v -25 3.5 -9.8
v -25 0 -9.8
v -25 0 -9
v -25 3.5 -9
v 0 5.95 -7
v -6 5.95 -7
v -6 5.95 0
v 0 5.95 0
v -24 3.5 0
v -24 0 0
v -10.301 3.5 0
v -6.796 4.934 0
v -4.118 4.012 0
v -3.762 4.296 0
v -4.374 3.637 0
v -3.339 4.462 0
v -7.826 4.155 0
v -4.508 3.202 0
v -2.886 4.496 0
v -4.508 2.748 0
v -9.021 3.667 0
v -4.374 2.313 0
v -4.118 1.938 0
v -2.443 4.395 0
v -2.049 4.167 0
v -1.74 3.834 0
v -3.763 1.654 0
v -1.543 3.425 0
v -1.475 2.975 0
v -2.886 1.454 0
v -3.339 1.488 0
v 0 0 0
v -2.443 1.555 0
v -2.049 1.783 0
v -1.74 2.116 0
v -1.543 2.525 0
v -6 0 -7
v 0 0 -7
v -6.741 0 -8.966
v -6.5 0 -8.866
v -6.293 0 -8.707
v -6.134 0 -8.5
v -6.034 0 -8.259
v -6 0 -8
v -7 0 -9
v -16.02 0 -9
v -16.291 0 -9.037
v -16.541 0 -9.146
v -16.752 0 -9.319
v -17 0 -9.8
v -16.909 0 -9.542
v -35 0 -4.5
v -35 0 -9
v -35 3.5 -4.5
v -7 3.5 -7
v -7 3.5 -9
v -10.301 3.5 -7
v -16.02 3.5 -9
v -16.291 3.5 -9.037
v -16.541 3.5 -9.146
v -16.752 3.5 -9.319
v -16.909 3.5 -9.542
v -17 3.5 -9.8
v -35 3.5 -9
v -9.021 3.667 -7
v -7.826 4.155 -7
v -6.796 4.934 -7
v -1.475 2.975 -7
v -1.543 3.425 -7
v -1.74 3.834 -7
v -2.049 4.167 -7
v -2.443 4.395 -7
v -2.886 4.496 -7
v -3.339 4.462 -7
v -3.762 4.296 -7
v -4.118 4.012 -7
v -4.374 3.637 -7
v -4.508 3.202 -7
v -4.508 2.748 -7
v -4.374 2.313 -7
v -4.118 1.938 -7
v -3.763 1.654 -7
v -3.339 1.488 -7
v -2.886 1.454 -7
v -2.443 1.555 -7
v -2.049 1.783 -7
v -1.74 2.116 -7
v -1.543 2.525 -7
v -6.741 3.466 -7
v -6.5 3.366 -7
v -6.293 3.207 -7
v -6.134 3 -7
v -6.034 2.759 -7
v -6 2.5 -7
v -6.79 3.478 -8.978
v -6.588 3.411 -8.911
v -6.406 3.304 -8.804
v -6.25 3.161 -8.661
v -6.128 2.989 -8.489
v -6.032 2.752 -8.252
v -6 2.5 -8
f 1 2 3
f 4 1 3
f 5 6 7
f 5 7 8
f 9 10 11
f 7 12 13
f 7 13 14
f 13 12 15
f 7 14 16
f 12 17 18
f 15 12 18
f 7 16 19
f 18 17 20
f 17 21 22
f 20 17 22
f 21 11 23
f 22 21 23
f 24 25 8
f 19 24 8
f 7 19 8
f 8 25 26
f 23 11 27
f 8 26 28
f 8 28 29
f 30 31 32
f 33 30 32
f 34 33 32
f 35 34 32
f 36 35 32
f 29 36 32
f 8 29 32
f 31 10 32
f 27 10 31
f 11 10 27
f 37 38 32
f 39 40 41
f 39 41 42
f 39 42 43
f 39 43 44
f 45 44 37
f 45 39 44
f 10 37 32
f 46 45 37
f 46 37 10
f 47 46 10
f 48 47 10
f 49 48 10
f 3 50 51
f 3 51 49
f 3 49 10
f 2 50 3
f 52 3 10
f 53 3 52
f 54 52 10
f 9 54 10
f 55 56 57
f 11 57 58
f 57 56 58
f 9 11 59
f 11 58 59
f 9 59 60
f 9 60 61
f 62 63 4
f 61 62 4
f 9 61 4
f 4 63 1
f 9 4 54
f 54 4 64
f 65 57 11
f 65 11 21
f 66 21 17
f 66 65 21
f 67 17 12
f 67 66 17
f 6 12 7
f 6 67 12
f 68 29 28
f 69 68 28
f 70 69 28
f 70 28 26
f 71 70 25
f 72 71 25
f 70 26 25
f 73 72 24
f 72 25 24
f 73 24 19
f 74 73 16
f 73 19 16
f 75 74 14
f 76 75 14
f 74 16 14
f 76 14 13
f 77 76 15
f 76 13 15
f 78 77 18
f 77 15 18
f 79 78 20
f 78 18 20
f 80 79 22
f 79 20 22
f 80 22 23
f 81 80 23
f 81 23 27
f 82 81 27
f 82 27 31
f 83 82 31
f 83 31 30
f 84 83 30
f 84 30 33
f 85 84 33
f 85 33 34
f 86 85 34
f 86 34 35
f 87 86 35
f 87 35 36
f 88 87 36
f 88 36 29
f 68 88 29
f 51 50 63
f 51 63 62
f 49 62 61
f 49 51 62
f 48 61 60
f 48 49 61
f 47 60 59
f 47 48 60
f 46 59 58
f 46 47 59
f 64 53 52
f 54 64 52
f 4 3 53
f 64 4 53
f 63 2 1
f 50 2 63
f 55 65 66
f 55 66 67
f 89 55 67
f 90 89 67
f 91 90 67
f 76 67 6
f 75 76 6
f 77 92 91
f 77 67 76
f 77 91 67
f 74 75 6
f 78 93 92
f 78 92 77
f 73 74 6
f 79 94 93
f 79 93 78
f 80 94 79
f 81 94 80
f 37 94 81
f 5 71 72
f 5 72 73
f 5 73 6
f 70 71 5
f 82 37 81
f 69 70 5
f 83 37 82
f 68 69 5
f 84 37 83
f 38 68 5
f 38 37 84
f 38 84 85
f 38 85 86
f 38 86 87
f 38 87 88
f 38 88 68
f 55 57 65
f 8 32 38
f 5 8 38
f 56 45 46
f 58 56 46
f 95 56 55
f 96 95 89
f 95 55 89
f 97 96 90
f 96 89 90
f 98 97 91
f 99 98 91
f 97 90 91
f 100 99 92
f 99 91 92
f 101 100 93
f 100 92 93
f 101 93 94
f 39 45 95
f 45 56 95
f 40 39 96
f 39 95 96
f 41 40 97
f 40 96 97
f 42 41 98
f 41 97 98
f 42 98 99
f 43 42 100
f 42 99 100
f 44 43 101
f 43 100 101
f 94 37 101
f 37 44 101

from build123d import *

# Parameters (mm, degrees)
EXTRUDE_1_DEPTH     = 3.5
SKETCH_2_W          = 6
SKETCH_2_H          = 9
EXTRUDE_2_DEPTH     = 5.95
SKETCH_3_R          = 1.525
CUT_EXTRUDE_1_DEPTH = 38.475358571
SKETCH_4_W          = 8
SKETCH_4_H          = 2.2
CUT_EXTRUDE_2_DEPTH = 10
CUT_EXTRUDE_START   = -9
SKETCH_5_W          = 6
SKETCH_5_H          = 5.95
CUT_EXTRUDE_4_DEPTH = 2
FILLET_1_R          = 5
FILLET_2_R          = 1
FILLET_3_R          = 1


with BuildPart() as part:
    # 草图1 → 凸台-拉伸1 (new body)
    with BuildSketch(Plane(origin=(0, 0, 0), x_dir=(1, 0, 0), z_dir=(0, 1, 0))):
        Polygon((0, 0), (0, 9), (-17, 9), (-17, 12), (-24, 12), (-25, 12), (-25, 9), (-34, 9), (-35, 9), (-35, 4.5), (-24, 0), (-8, 0), align=None)
    extrude(amount=EXTRUDE_1_DEPTH)

    # 草图2 → 凸台-拉伸2 (add)
    with BuildSketch(Plane(origin=(0, 0, 0), x_dir=(1, 0, 0), z_dir=(0, 1, 0))):
        with Locations((-3, 4.5)):
            Rectangle(SKETCH_2_W, SKETCH_2_H)
    extrude(amount=EXTRUDE_2_DEPTH)

    # 草图3 → 切除-拉伸1 (cut, through all)
    with BuildSketch(Plane.XY):
        with Locations((-3, 2.975)):
            Circle(SKETCH_3_R)
    extrude(amount=-CUT_EXTRUDE_1_DEPTH, mode=Mode.SUBTRACT)

    # 草图4 → 切除-拉伸2 (cut)
    with BuildSketch(Plane(origin=(0, 0, 0), x_dir=(1, 0, 0), z_dir=(0, 1, 0))):
        with Locations((-21, 10.9)):
            Rectangle(SKETCH_4_W, SKETCH_4_H)
    extrude(amount=CUT_EXTRUDE_2_DEPTH, mode=Mode.SUBTRACT)

    # 草图5 → 切除-拉伸4 (cut)
    with BuildSketch(Plane.XY.offset(CUT_EXTRUDE_START)):
        with Locations((-3, 2.975)):
            Rectangle(SKETCH_5_W, SKETCH_5_H)
    extrude(amount=CUT_EXTRUDE_4_DEPTH, mode=Mode.SUBTRACT)

    # 圆角1
    # the kernel refuses this fillet: 5 mm, written as the material it adds along each edge
    with BuildSketch(Plane(origin=(-6, 3.5, -7), x_dir=(-1, 0, 0), z_dir=(0, 0, 1))) as fillet_1_piece_1:
        with BuildLine():
            CenterArc((4.300872005, -5), FILLET_1_R, 90, 59.336170258)
            Line((0, -2.45), (0, 0))
            Line((0, 0), (4.300872005, 0))
        make_face()
    extrude(amount=7)

    # 圆角2
    fillet_2_edges = [part.edges().sort_by_distance(p)[0] for p in [
        (-6, 3.5, -8),
        (-6, 1.75, -9),
    ]]
    fillet(fillet_2_edges, radius=FILLET_2_R)

    # 圆角3
    # the kernel refuses this fillet: 1 mm, written as the material it adds along each edge
    with BuildSketch(Plane(origin=(-17, 0, -9), x_dir=(1, 0, 0), z_dir=(0, 1, 0))) as fillet_3_piece_1:
        with BuildLine():
            CenterArc((0.979795897, 1), FILLET_3_R, 191.536959033, 78.463040967)
            Line((0, 0.8), (-0.019595918, 0.796))
            ThreePointArc((-0.019595918, 0.796), (-0.02, 0.4), (-0.02, 0))
            Line((-0.02, 0), (0, -0.02))
            Line((0, -0.02), (0.979795897, -0.02))
            Line((0.979795897, -0.02), (0.979795897, 0))
        make_face()
    extrude(amount=3.5)


solid = part.part
